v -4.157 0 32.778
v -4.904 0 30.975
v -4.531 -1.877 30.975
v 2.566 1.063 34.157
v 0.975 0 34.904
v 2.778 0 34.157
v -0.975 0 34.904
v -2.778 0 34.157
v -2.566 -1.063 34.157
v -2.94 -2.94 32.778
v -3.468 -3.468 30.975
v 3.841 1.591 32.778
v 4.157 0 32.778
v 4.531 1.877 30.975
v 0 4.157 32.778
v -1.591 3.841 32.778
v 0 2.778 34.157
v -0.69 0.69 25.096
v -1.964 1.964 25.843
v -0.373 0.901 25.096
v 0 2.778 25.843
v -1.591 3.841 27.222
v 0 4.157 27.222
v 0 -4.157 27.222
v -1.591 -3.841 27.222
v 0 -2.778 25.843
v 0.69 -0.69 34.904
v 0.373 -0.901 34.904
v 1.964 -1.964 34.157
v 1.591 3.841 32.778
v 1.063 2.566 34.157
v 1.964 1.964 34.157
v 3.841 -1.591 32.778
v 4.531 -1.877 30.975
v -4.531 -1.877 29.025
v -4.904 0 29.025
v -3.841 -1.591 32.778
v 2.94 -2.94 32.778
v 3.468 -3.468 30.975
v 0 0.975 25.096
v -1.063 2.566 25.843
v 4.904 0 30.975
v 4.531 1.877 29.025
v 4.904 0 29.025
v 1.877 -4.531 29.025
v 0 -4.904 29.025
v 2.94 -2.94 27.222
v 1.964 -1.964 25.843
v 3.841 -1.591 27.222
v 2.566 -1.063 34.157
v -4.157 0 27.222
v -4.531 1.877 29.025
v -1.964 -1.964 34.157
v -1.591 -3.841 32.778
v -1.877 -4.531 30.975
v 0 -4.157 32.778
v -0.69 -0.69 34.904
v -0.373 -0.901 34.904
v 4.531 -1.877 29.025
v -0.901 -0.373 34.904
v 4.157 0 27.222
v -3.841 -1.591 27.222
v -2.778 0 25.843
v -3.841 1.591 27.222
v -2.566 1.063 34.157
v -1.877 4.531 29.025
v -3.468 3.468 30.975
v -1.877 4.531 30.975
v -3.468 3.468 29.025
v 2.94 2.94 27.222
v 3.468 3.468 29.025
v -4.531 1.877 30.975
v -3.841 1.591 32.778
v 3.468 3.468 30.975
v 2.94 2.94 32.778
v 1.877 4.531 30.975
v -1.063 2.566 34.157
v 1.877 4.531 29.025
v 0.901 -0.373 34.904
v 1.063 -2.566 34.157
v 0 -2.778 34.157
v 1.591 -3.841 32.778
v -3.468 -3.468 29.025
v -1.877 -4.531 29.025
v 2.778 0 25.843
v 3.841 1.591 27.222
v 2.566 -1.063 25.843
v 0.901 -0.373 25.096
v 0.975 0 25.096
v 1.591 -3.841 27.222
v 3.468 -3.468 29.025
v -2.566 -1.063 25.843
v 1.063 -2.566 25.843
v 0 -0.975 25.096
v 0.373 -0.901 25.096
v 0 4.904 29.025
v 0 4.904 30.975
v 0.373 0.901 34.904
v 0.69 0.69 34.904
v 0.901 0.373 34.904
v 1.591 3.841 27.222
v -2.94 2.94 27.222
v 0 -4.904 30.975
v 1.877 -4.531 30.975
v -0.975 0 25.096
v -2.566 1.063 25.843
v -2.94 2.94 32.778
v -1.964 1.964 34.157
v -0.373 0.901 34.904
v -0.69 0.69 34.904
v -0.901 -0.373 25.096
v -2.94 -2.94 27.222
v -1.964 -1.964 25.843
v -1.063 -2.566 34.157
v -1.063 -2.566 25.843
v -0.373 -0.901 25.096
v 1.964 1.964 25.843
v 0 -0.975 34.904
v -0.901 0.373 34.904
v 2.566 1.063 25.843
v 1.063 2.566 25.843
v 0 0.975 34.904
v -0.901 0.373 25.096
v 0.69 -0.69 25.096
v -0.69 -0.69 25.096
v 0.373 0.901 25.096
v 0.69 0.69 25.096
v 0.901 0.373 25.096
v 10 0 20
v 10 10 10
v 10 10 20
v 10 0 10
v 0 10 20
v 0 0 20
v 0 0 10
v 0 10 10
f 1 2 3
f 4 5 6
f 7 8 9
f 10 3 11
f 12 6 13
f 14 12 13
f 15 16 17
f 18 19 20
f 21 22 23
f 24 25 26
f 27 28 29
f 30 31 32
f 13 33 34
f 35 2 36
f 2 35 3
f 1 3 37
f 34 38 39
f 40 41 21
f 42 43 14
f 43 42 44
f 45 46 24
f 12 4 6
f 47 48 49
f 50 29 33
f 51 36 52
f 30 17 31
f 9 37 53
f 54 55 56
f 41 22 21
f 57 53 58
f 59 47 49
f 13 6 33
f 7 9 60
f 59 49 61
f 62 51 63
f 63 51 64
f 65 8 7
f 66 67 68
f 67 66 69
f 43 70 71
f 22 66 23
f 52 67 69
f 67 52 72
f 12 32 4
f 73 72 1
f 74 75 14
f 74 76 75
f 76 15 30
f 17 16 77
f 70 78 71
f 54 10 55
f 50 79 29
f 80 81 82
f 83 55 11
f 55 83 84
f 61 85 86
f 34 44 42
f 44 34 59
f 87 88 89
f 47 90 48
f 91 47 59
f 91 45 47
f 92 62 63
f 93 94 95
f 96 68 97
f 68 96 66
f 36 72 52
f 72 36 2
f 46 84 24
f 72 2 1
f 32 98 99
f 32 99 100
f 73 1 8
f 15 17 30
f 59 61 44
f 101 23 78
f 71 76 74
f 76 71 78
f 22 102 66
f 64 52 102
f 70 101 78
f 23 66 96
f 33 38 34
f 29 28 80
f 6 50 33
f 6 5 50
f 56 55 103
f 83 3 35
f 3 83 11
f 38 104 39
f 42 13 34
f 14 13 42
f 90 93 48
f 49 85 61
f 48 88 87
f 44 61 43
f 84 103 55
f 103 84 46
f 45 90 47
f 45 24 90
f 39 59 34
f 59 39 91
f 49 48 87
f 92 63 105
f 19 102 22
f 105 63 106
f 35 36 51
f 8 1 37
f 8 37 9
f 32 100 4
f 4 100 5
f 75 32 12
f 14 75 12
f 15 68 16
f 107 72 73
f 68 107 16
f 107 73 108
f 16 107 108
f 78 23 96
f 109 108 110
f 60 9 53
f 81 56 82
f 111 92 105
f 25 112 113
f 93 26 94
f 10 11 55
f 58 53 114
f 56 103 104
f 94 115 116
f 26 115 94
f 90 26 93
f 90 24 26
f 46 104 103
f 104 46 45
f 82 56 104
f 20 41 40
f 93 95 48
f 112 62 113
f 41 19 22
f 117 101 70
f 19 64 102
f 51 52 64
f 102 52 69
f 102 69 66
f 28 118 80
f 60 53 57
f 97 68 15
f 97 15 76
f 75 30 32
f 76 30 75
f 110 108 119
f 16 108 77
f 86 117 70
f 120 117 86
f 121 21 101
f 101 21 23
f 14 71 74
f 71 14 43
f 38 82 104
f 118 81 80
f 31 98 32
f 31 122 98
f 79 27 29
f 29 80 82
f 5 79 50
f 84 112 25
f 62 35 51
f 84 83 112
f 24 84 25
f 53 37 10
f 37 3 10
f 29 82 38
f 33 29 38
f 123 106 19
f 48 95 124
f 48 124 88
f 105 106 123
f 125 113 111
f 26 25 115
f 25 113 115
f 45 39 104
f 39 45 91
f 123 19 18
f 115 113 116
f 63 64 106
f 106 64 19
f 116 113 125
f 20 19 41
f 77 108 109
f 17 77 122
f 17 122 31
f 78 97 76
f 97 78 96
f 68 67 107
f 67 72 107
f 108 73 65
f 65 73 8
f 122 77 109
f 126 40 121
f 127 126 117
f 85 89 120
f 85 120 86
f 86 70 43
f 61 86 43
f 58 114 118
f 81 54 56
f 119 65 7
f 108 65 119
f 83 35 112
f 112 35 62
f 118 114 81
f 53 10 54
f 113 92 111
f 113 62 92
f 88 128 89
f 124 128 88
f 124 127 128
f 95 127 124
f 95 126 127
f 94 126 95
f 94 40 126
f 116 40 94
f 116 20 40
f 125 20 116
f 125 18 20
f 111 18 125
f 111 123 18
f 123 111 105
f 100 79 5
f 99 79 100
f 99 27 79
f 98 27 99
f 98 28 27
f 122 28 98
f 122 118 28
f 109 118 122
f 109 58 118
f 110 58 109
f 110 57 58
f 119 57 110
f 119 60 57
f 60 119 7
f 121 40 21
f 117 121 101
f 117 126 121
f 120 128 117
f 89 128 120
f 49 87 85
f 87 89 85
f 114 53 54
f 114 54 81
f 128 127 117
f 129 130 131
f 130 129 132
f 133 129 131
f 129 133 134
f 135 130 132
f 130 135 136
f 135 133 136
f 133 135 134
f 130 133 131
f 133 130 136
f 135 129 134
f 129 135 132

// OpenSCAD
//This is a temporary framework for learning how to animate artifacts.

//** Note that I need to be fluent in programming motion in openscad if I want to be any good at bringing plastic to life with a 3D printer.


//Goal of program is to show how to structure an animation inopenscad 

//gif of the motion to be reproduced can be seen here. (https://pbs.twimg.com/tweet_video/CNoCFfkUAAAXShf.mp4.)


// Module variable overview. 
// function for moving an object from a start coordinate pair to end parameters for calling are as follows

//(startx, starty, endx, endy)

// the above parameters are to help mantain an extremely parametric program

//simple shape to start with "from scorchCAD" examples
module
 object1(){
	intersection(){
		cube(9,center=true);
		color("red");
		sphere(6);
		}	
	}

//You need to then call the module you made in order to render it...


//////////////////////////////////////////////////////////////////////////////////////RENDERS//////////////////////////////////////////////////////////////////////////////////////////
	

// BASE OBJECT IN BELOW TRANSFORMATION object1();



//////////////////////////////////////////////////////////////////////////////////////MOTION///////////////////////////////////////////////////////////////////////////////////////////




//***********************************************************//***************************Test****************************//***********************************************************


//The transformation I am looking for in the next snippet of code is a movement along the Z-axis of the object we desire to translate.

//default example animation code


//This operation takes our custom object1() and rotates it 360 degrees along the Z-axis while keeping it's origin point at default spawn
rotate([0,0,$t*360]) translate([0,0,0]) object1();


//This operation rotates the sphere around the origin along the Y-axis
rotate([0,$t*360,0]) translate([0,0,30]) sphere(5);

//This operation rotates the cube around the X-axis
rotate([$t*360,0,0]) translate([0,0,10]) cube(10);
